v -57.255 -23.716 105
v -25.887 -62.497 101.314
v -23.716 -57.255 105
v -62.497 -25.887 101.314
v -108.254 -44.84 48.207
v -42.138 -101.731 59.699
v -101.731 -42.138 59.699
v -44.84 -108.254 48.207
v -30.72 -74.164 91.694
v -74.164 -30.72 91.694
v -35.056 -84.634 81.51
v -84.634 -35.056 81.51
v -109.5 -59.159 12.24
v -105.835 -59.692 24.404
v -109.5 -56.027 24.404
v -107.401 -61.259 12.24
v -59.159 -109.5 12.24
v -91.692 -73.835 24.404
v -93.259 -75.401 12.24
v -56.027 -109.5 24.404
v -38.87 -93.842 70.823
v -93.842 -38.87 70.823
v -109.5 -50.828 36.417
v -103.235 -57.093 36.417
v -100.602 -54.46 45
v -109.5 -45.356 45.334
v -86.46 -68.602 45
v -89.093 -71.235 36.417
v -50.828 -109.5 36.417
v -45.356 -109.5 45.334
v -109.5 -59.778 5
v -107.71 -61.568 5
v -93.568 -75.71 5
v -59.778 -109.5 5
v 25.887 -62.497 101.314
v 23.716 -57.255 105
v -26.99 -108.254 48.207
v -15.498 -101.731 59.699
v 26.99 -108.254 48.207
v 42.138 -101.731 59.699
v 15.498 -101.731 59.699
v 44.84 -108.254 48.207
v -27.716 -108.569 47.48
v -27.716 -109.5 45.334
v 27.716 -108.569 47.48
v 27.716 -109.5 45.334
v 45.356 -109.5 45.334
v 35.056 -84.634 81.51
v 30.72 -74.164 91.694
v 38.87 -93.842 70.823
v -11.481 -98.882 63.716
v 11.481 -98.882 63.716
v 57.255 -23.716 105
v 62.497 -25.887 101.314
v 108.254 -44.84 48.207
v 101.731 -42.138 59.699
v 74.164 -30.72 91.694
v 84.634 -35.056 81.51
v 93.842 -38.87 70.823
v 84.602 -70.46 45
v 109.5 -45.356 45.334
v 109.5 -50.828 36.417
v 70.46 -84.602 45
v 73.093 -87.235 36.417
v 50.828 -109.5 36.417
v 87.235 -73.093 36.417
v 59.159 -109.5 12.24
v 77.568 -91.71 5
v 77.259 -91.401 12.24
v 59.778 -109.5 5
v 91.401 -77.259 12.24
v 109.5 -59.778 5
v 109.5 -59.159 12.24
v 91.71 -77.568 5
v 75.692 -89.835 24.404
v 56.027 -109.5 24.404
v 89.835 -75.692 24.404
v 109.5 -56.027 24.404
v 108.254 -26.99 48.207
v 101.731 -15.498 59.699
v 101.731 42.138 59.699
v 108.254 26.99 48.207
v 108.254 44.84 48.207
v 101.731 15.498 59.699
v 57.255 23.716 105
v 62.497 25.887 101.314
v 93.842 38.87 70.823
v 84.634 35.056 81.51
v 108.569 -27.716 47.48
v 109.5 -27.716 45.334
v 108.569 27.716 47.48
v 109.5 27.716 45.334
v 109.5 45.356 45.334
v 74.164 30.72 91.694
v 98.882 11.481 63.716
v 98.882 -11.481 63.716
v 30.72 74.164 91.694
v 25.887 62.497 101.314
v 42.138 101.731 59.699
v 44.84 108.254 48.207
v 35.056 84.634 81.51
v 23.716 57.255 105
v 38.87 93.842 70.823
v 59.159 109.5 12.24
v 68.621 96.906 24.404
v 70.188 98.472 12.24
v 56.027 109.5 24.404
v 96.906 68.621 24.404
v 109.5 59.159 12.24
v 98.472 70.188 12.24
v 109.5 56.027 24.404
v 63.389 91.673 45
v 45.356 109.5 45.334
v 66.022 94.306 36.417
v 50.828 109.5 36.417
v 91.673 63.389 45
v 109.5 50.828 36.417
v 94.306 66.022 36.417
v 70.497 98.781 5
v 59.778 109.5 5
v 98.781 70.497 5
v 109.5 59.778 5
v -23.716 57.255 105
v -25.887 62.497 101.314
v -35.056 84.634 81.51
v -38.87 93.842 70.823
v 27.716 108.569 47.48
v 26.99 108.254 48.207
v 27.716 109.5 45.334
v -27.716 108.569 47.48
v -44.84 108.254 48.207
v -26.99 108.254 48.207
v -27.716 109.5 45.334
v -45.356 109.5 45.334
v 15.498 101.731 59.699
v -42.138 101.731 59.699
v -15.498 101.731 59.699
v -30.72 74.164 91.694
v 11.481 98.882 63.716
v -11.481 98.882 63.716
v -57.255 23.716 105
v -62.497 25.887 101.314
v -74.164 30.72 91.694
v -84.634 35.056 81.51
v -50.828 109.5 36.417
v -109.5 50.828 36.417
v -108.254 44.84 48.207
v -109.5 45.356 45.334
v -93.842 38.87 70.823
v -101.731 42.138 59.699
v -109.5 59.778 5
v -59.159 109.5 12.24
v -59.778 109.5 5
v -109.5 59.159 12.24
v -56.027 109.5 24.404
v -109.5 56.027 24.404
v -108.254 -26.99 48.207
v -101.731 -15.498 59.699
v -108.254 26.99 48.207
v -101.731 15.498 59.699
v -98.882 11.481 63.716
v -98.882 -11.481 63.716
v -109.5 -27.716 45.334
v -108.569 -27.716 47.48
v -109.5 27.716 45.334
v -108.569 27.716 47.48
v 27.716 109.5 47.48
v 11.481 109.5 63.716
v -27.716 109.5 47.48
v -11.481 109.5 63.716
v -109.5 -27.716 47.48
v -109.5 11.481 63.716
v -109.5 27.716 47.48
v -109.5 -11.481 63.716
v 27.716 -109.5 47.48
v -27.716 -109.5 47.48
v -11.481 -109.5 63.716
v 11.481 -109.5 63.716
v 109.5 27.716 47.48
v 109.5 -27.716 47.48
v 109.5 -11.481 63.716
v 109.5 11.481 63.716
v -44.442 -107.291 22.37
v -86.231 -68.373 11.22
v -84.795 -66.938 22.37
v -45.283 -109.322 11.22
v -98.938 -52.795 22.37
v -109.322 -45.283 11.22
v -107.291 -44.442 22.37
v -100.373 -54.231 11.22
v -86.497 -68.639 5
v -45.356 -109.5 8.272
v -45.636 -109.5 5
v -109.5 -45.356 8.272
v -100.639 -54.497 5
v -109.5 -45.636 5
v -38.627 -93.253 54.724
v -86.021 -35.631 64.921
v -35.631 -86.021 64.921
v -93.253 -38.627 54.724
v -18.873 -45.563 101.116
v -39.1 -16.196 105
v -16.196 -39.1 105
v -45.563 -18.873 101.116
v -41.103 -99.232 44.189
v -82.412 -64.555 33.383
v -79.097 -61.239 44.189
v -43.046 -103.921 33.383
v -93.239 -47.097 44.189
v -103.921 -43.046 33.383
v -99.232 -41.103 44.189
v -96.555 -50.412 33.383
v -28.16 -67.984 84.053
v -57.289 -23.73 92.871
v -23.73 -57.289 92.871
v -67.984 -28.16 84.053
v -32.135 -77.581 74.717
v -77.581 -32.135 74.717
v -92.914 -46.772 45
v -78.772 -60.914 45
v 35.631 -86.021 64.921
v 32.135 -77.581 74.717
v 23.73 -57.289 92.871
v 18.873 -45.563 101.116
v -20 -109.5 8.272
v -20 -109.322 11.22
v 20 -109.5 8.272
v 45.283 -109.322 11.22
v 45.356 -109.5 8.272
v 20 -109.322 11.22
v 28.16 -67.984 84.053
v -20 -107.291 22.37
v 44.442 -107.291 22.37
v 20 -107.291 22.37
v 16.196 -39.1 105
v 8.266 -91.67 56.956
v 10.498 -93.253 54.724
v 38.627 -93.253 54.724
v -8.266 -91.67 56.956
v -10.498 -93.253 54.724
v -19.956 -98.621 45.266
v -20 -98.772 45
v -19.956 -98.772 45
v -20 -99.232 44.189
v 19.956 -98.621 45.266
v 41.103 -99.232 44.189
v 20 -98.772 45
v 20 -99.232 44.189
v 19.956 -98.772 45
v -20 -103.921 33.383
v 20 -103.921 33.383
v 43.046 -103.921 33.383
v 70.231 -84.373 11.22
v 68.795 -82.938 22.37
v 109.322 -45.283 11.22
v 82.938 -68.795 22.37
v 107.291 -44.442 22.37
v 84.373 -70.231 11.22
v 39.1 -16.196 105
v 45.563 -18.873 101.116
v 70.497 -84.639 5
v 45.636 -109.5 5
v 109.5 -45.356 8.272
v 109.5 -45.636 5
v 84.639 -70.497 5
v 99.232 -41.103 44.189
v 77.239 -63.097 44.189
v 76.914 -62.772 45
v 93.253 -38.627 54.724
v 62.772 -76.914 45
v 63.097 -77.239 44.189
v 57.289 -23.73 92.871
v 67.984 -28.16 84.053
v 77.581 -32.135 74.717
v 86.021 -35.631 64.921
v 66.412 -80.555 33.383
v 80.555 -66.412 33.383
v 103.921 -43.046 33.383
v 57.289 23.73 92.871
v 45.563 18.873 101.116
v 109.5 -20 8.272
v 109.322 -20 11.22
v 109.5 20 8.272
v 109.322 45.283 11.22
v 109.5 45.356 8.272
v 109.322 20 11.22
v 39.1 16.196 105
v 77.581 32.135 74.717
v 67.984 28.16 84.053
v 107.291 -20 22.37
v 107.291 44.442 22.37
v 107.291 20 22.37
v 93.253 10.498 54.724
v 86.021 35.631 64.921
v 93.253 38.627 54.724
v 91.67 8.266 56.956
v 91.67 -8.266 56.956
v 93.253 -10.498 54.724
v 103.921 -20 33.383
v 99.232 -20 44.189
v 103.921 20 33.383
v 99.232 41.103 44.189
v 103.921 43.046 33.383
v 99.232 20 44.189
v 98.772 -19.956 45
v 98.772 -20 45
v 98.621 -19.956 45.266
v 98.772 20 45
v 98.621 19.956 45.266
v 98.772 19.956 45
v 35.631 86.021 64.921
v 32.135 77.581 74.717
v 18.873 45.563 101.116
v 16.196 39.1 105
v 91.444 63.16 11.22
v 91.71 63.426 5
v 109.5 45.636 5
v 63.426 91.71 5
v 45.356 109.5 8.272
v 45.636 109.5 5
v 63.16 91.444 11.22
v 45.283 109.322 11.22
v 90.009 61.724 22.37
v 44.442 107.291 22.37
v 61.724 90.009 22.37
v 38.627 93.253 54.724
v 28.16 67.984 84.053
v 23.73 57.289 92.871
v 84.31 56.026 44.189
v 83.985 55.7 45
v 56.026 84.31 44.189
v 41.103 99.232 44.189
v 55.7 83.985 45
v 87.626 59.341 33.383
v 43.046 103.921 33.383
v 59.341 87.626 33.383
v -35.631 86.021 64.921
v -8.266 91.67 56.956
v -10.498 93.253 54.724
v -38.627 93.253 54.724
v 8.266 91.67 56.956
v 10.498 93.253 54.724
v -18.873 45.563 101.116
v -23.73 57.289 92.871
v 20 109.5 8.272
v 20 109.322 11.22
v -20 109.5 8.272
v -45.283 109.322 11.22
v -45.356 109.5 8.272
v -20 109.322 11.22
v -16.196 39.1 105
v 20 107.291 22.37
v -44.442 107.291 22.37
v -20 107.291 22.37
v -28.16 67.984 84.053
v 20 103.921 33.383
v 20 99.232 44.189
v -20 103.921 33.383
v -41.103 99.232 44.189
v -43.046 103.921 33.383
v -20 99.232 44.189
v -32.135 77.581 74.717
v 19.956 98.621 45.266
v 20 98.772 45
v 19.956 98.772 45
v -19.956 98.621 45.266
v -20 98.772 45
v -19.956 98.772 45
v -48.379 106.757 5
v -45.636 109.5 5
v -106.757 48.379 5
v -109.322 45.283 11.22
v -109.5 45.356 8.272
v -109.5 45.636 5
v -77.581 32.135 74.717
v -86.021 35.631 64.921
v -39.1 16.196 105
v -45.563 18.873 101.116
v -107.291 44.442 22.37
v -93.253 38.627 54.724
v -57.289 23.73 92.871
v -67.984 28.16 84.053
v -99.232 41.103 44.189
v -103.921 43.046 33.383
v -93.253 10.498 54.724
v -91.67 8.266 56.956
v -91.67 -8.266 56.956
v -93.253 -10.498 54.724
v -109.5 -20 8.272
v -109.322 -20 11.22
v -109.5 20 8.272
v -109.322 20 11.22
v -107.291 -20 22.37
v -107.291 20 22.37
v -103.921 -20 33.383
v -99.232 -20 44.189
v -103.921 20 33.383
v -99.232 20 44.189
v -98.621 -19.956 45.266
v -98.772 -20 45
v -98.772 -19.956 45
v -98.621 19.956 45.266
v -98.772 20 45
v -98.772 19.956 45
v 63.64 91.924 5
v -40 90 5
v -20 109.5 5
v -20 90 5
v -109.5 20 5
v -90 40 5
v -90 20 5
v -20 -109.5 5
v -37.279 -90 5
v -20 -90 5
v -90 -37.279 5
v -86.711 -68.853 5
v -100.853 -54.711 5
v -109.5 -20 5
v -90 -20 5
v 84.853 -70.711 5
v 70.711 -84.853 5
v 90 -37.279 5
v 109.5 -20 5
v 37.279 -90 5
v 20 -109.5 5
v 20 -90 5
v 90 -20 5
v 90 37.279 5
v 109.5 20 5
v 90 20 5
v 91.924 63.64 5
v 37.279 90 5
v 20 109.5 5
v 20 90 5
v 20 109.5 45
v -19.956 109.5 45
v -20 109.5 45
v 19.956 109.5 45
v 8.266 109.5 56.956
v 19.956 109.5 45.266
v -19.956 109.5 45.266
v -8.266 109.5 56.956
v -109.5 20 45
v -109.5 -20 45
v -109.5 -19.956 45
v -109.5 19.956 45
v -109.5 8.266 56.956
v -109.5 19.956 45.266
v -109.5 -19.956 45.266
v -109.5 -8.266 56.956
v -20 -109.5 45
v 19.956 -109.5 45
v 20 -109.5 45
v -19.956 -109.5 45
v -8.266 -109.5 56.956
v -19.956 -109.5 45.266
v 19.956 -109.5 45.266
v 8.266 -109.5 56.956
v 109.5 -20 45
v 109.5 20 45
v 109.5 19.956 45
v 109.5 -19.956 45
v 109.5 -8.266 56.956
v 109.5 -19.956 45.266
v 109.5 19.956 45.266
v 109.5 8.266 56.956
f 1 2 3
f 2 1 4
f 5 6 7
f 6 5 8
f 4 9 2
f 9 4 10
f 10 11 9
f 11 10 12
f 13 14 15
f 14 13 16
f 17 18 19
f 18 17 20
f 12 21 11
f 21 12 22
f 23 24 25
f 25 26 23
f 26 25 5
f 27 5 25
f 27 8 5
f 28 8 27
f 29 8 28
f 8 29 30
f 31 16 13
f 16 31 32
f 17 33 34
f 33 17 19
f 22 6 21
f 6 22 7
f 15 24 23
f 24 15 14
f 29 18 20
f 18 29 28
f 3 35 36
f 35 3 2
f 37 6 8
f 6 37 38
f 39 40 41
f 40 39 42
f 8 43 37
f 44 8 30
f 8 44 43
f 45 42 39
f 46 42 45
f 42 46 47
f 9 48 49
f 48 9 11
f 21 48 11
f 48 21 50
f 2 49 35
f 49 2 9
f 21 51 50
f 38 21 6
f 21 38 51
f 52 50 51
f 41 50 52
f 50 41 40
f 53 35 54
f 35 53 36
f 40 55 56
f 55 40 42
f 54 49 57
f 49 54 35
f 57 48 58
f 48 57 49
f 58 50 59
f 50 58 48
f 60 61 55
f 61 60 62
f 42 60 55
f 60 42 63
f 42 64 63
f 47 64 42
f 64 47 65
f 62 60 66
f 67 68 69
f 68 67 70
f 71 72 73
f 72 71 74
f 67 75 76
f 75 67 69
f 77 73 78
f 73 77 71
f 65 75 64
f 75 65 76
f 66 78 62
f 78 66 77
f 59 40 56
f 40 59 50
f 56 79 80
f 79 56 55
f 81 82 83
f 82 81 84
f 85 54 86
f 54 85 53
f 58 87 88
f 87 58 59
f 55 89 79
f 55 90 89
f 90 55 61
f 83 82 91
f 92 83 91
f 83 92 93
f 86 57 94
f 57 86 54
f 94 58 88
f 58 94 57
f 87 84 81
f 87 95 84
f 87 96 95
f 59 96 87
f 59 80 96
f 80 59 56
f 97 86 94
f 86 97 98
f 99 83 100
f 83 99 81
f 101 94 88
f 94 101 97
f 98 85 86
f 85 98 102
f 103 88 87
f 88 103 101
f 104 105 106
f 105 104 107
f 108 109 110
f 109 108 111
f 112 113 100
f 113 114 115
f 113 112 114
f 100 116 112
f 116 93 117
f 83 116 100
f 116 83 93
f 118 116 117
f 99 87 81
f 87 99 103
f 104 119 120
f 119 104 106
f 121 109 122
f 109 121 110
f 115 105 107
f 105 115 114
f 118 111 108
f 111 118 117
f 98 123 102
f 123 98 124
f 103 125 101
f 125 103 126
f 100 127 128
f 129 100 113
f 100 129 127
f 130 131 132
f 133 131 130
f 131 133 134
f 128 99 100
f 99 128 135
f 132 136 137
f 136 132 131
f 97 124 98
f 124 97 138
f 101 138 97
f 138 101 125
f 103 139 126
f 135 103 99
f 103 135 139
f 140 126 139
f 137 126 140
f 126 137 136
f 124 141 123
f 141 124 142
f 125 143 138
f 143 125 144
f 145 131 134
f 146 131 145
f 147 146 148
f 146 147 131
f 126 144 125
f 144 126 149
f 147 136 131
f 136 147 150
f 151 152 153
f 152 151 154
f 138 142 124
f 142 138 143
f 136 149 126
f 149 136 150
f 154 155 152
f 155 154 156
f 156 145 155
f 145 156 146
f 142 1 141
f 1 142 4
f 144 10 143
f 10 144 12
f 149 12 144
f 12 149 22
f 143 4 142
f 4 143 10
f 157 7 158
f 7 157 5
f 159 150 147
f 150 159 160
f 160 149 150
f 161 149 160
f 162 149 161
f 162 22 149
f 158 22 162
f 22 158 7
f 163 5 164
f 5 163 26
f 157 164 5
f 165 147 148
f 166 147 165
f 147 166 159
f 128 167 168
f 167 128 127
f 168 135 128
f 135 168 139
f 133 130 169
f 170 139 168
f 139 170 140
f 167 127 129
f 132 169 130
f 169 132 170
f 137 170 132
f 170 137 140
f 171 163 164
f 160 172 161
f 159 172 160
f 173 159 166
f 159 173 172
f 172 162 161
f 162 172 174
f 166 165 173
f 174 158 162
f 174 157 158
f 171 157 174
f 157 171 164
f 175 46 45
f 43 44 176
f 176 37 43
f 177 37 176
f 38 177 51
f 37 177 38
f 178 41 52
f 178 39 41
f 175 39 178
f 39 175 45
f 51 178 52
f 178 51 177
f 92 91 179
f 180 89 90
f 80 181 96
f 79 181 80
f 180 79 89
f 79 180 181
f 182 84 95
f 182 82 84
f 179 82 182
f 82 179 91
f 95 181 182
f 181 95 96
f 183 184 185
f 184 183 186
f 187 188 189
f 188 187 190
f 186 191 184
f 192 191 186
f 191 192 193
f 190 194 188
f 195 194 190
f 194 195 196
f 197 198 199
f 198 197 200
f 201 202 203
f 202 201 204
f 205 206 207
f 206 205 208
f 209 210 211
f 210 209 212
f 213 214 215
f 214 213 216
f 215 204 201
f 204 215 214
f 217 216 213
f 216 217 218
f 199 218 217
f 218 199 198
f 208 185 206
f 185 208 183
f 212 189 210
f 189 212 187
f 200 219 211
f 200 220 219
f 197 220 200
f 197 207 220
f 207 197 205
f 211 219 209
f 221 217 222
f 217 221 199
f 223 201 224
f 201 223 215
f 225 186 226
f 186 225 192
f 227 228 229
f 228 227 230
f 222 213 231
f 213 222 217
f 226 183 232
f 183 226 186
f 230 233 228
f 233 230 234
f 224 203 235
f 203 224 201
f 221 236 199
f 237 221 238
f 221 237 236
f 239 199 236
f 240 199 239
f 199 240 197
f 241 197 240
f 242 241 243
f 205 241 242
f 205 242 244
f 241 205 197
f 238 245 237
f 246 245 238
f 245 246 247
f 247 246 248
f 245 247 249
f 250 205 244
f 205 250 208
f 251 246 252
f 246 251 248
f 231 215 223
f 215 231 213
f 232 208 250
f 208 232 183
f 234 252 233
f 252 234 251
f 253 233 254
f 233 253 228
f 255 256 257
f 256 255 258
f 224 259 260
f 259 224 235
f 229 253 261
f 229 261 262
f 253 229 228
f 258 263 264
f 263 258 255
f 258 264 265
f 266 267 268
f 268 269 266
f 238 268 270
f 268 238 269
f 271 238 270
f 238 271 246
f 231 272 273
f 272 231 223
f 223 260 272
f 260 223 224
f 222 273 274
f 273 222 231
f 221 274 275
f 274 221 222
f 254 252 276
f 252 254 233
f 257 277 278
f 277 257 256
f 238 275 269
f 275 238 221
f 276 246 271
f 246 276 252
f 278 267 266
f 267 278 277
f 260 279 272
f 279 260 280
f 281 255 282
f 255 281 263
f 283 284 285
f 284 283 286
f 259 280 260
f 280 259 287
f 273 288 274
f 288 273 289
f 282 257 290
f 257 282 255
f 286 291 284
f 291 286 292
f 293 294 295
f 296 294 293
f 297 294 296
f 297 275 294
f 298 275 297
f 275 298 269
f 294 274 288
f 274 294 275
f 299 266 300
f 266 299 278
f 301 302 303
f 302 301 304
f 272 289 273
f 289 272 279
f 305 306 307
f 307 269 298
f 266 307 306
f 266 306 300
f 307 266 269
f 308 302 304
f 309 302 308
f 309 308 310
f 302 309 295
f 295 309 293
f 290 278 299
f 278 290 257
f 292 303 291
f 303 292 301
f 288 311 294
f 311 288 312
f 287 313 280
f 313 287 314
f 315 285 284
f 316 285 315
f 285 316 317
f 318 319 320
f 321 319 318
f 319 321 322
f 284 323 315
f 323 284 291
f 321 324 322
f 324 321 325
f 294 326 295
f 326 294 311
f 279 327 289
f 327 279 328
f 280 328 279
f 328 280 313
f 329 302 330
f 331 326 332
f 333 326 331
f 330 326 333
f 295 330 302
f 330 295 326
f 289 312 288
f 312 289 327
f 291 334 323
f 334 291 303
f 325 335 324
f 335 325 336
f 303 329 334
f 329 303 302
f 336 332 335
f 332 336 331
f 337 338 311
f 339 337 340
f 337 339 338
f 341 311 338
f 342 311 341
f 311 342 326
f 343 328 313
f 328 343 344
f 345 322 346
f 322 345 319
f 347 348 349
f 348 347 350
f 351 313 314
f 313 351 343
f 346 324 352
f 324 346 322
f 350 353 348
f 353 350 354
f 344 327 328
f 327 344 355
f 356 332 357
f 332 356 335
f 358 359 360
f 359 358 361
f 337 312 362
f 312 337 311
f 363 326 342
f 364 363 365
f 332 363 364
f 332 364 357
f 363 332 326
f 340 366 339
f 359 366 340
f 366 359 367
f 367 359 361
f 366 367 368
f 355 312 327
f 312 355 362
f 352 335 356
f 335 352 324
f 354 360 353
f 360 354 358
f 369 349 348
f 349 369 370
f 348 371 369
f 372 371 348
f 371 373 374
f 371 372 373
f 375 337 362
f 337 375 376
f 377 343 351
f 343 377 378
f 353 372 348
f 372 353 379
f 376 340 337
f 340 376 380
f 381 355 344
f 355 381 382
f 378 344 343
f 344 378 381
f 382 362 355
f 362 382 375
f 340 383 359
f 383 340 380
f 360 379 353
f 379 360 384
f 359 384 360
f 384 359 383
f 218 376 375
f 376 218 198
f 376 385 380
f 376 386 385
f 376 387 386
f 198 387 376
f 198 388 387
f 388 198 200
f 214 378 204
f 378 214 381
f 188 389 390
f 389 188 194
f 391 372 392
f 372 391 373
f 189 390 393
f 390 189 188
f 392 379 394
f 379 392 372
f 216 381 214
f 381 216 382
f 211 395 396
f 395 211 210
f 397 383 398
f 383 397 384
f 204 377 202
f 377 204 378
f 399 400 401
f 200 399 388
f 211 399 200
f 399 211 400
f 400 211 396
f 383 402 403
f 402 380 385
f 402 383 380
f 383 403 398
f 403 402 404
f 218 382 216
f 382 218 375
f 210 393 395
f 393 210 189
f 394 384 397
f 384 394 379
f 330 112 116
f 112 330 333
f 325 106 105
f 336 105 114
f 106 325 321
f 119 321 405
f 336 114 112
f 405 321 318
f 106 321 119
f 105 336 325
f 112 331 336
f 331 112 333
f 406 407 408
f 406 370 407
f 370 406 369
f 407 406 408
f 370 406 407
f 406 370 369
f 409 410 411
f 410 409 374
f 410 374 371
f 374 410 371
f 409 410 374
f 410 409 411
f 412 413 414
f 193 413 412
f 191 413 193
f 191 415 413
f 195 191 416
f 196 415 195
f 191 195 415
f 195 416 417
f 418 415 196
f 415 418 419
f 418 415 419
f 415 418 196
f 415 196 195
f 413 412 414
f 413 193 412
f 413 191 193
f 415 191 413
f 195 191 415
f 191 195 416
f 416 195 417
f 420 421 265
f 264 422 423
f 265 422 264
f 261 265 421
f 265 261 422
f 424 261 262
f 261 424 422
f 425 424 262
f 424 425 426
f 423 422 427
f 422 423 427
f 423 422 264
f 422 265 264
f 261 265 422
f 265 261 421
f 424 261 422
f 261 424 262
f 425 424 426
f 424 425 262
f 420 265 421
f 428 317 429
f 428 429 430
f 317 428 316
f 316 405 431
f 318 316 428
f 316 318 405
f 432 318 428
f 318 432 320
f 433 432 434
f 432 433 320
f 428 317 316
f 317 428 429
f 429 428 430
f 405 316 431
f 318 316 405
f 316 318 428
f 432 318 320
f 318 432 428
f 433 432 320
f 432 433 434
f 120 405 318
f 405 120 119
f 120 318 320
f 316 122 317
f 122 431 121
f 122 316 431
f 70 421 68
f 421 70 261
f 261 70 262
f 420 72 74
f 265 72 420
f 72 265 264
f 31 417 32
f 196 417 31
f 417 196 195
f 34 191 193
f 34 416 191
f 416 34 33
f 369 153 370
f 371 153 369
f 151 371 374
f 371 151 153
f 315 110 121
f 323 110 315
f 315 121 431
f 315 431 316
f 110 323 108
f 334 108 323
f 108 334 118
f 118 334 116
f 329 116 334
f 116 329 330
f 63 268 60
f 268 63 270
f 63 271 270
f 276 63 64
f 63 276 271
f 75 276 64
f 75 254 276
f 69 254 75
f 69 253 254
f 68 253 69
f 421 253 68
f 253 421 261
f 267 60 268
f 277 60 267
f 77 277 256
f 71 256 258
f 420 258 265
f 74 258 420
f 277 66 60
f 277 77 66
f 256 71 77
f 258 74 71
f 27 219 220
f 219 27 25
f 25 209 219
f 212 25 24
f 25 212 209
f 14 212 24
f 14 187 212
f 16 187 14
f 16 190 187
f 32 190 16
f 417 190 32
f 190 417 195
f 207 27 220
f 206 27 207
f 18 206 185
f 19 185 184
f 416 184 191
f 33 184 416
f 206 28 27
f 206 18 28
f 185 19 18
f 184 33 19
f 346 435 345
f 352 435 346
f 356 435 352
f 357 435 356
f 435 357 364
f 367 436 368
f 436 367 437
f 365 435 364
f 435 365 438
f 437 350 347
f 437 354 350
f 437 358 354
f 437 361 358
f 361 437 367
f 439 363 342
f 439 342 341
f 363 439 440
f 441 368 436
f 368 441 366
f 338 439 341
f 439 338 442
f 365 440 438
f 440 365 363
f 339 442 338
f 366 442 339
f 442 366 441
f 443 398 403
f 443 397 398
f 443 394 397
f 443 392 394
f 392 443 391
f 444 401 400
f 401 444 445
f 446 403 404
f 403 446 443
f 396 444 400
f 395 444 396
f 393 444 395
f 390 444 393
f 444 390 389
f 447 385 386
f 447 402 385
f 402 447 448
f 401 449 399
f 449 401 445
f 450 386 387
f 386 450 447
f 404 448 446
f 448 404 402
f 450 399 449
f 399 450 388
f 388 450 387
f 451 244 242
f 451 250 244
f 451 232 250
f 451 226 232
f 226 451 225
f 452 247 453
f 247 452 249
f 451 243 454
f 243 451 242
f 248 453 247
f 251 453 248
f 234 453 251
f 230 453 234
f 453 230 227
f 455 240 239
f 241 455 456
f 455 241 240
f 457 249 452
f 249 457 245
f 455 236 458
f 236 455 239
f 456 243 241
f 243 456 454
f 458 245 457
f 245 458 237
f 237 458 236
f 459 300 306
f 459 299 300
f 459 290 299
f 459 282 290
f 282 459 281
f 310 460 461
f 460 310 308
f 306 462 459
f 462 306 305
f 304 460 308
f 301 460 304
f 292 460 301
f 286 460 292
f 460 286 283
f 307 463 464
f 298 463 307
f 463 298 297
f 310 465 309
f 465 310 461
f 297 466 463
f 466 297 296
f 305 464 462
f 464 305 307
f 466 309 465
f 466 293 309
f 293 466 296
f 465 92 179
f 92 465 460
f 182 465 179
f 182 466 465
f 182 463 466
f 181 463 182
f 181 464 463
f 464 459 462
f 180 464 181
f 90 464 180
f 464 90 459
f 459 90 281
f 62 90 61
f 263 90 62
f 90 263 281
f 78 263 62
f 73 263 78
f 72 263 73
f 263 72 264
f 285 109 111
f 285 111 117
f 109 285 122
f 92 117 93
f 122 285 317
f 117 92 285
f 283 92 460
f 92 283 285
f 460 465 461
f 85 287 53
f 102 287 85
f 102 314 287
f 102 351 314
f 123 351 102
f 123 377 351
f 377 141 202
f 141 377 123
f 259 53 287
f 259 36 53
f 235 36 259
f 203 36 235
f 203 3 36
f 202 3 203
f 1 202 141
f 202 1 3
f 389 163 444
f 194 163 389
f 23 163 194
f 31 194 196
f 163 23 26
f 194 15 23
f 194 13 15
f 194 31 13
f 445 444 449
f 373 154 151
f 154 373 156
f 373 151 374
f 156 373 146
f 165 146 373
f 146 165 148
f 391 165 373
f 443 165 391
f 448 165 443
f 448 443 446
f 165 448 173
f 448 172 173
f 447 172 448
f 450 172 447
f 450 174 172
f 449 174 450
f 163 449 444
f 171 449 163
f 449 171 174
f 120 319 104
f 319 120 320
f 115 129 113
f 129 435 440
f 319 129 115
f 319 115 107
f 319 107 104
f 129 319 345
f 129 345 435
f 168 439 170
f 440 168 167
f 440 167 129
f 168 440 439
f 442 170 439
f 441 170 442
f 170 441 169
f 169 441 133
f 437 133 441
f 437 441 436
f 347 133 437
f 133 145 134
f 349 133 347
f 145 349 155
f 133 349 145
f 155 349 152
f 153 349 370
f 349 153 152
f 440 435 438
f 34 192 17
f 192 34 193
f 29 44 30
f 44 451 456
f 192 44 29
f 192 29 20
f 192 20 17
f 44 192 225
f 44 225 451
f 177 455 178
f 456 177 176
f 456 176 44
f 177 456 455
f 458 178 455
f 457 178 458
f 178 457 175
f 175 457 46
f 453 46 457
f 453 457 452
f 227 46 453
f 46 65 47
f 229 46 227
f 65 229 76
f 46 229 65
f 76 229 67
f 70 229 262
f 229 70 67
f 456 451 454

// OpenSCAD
/*

todo Kuppelbunker:

* refactorieren um schalungen einfacher machen zu können
* bad beton und innenausbau teli separieren
* in 3 gießbare Teile zerlegen
* Schalungen anlegen

später/weniger wichtig
* Wohnung
  * Küche Wände
  * Durchstieg + Leiter
  * Bad andeuten
  * Küche andeuten
  * erhöhter Eingengsbereich + Wohnungstür
* Fahrstuhldach und oben Fenster
* Dachkontur
* Treppe zu Wohnung
* Schräge auf Dach für Fahrstuhl

*/


// 1 cm = 1 meter

//$fn = 60;

// DESIGN OPTIONS

cube=0;

kuppel=1;
galerie=1;
buehne=1;
saalboden=1;

wendeltreppen=0;
dach=0;
bad=0;
wohnung=0;
beschriftung=0;

scale([2,2,2])intersection(){
%translate([0, 0, -43.75]) cube([109.5, 109.5, 22.5], true); 
%translate([0, 0, -15]) cube([109.5, 109.5, 35], true); 
translate([0, 0, 27.5]) cube([109.5, 109.5, 50], true); 

difference(){
union(){
    if (cube) difference(){                                       // Quader
        cube([120, 120, 120], true);                                
        translate([0, 0, 5]) cube([110, 110, 120], true);            
    };


    difference(){
        if (kuppel) union(){
            kuppel(120);                                        // Kupel
            rotate([0, 0, 22.5]) cylinder(60, 50, 24, center=false, $fn=8);
            umtueren();
        };
        if (kuppel) {kuppel(110); 
        rotate([0, 0, 22.5]) cylinder(120, 18, 18, center=false, $fn=8);}
        // Dachluke
        
        translate([0, -55, -55]) cube([55, 55, 20], false);         // Keller Wände entfernen
        translate([-55, 0, -55]) cube([55, 55, 20], false);
        
        translate([40, 40, -45]) rotate([0, 0, 45]) cube([20, 20, 20], true); // Keller Türen
        translate([-38, -40, -45]) rotate([0, 0, 45]) cube([10, 10, 20], true);
        translate([-40, -55, -55]) cube([20, 20, 20], false);
        
        translate([40, 40, -22.5]) rotate([0, 0, 45]) cube([20, 20, 20], true); // Türen Saalboden
        translate([40, -40, -22.5]) rotate([0, 0, 45]) cube([10, 10, 20], true);
    //    translate([-40, -40, -22.5]) rotate([0, 0, 45]) cube([10, 10, 20], true);
        translate([-32, -48, -22.5]) rotate([0, 0, 45]) cube([10, 10, 20], true);
        translate([-40, 40, -20]) rotate([0, 0, 45]) cube([10, 10, 20], true);
        
        translate([40, 40, 12.5]) rotate([0, 0, 45]) cube([20, 20, 20], true); // Türen Galerie
        translate([40, -40, 12.5]) rotate([0, 0, 45]) cube([10, 20, 20], true);
      //  translate([-40, -40, 12.5]) rotate([0, 0, 45]) cube([20, 10, 20], true);
        translate([-48, -32, 12.5]) rotate([0, 0, 45]) cube([20, 10, 20], true);
    };
    if (saalboden) translate([0, 0, -35]) linear_extrude(2.5)                  // Kellerdecke
        polygon([[-55,55], [25,55], [55,25], [55,-55], [-25,-55], [-55, -25]]);
    if (buehne) translate([0, 0, -32.5]) linear_extrude(2.5)                // Bühne
        polygon([[-25,55], [-15,55], [-10,35], [-35,10], [-55,15],[-55, 25]]);
    if (galerie) for(i=[0:45:270]) rotate([0, 0, -i]) linear_extrude(2.5, center=false) // Galerie
        polygon([[-25,55], [25,55], [20,45], [-20,45]]);
    if (bad) {
        translate([0,0, 13.5])bad(23);
        translate([0,0, -16.5])bad(32.5);
        linear_extrude(2.5) polygon([[55,-55], [25,-55], [55,-25]]);        // Bad Decken
        translate([0, 0, 23]) linear_extrude(2.5) 
            polygon([[55,-55], [10,-55], [10,-53], [20,-53], [53,-20], [53,-10], [55,-10]]);
    }
    if (wohnung) {
        translate([0, 0, -7.5]) linear_extrude(2.5)         // Schlafkoje Boden
            polygon([[-55,55], [-25,55], [-55,25]]);
        translate([0, 0, 10]) linear_extrude(2.5)         // Bad Boden
            polygon([[-55,55], [-25,55], [-55,25]]);
        translate([0, 0, 32.5]) linear_extrude(2.5)         // Küche Boden
            polygon([[-55,55], [0,55], [0,47], [-18,47], [-47,18], [-47,0], [-55,0]]);
        translate([0, 0, 57.5]) linear_extrude(2.5)         // Küche Decke
            polygon([[-55,55], [0,55], [0,40], [-16.5,40], [-40,16.5], [-40,0], [-55,0]]);
    };
    if (wendeltreppen) {
    translate([0, 0, -35])linear_extrude(2.5) polygon([[-55,-55], [-25,-55], [-55,-25]]);
    color("blue")translate([0, 0, -32.6])wendeltreppe ([for (i=[8.35:33.1:480]) i ], 39.2);
    color("red")translate([0, 0, 1.2])wendeltreppe([for (i=[75:39:700]) i ], 45);  
    }
    if (dach) {      
    color("green")translate([0, 0, 42.052]) linear_extrude(2.5)         // Aussichtsplattform
            polygon([[-40,-55], [25,-55], [55,-55], [55, 30], [30, 55], [0, 55], [0, 35], [18, 35], [35, 18], [35,-18], [16,-38], [-16.5,-38], [-38,-16.5], [-38,-10], [-55,-10], [-55,-29], [-40,-40], [-46,-46]]);
    
    
    }
        
}
    tueren();                                                   // Außentüren
    
    translate([-65, 25, -55]) cube([40, 40, 20], false);        // Keller Fenster
    translate([25, -65, -55]) cube([40, 40, 20], false);
    
    translate([54, -44, 12]) cube([7, 2, 5], false);            // Toiletten Fenster
    translate([42, -61, 12]) cube([2, 7, 5], false);
    translate([54, -44, -22]) cube([7, 2, 5], false);       
    translate([42, -61, -22]) cube([2, 7, 5], false);
    
    translate([-61, 46, -20]) cube([7, 2, 5], false);            // Backstage Fenster
    
    translate([-61, 46, 2]) cube([7, 2, 5], false);            // Wohnung Fenster
    translate([-61, 46, 22]) cube([7, 2, 5], false);       
    translate([-42, 54, 22]) cube([2, 7, 5], false); 
    translate([-61, 46, 45]) cube([7, 2, 5], false);  
    translate([-61, 24, 45]) cube([7, 2, 5], false);  
    mirror([1,1,0])translate([-61, 24, 45]) cube([7, 2, 5], false);  
    
    translate([-61, -44, 42]) cube([7, 2, 5], false);            // Treppen Fenster
    translate([-42, -61, 30]) cube([2, 7, 5], false); 
    translate([-61, -44, 18]) cube([7, 2, 5], false);         
    translate([-42, -61, 5]) cube([2, 7, 5], false);
    translate([-61, -44, -7]) cube([7, 2, 5], false);       
    translate([-42, -61, -22]) cube([2, 7, 5], false);
 
 //   rotate([0, 0, 180])
   // translate([0, -60,0]) color("blue") cube([170, 120, 150], true);    
  //  rotate([0, 0, 90])
    //translate([0, -60,0]) color("blue") cube([170, 120, 150], true);
    
   // translate([0, 0, 70]) color("blue") cube([150, 150, 120], true);
   
}
}

if (beschriftung) beschriftungen();



module beschriftungen(){
translate([60, 60, -60]) text("Fahrstuhl");
translate([60, -60, -60]) text("Toiletten");
translate([-60, -60, -60]) text("Treppe", halign = "right");
translate([-60, 60, -60]) text("Wohnung", halign = "right");
}

module tueren()
for (i=[0:90:270]) rotate([0, 0, i]) {
    translate([0, 60, 12.5]) cube([20, 30, 20], true);
    translate([0, 60, 18.5]) rotate([90, 45/2, 0]) cylinder(50, 10.8, 10.8, true, $fn=8);
};
  
module umtueren()
for (i=[0:90:270]) rotate([0, 0, i]) 
    translate([0, 50, 18]) rotate([90, 45/2, 0]) cylinder(20, 15, 15, true, $fn=8);
  
module kuppel(w)
intersection_for(n = [1 : 8]){
    rotate([0, 0, n * 45])
    hull() {
        intersection(){
            translate([w/2, 0, 0])scale([1, 1, 0.65])rotate([90, 0, 0]) cylinder(w, w, w, true , $fn=80);
            translate([0, 0, w*0.25])cube([2*w, 2*w, w*0.75], true);
        };
        translate([0, 0, -w/2])cube([w, w, 0.1], true);
    }
}
module bad(h) {
translate([55, -55.75, 0.25-h/2]) rotate([0, 0, 45]) cube([1, 10, h]);  // Wand
                                                                        // Toiletten
translate([52.5, -36, 0.25-h/2]) rotate([0, 0, 60])resize([6,4,4]) cylinder($fn=10,center=false);
translate([36, -52.5, 0.25-h/2]) rotate([0, 0, 30])resize([6,4,4]) cylinder($fn=10,center=false);

translate([48, -53, 0.25-h/2]) cylinder(8,1,2,$fn=10,center=false);     // Waschbecken
translate([53, -48, 0.25-h/2]) cylinder(8,1,2,$fn=10,center=false);
}

module wendeltreppe(stufen, hoehe)
for (i=[0:len(stufen)-1], h=hoehe/len(stufen))
{
    echo(i, h);
    hull(){
translate([0, 0, h*i])  one_step (stufen[i]);
if(i<len(stufen)-1) translate([0, 0, h*(i+1)]) one_step (stufen[i+1]);
if(i<len(stufen)-1)  translate([0, 0, h*(i+1)]) one_step (stufen[i]);
    }
    
};

module one_step (i)
intersection(){
    linear_extrude(200)  polygon([[-55,-55], [-25,-55], [-55,-25]]);
    translate([-46,-46,0]) rotate([0, 0, i]) cube([20,1, 1]);
}
